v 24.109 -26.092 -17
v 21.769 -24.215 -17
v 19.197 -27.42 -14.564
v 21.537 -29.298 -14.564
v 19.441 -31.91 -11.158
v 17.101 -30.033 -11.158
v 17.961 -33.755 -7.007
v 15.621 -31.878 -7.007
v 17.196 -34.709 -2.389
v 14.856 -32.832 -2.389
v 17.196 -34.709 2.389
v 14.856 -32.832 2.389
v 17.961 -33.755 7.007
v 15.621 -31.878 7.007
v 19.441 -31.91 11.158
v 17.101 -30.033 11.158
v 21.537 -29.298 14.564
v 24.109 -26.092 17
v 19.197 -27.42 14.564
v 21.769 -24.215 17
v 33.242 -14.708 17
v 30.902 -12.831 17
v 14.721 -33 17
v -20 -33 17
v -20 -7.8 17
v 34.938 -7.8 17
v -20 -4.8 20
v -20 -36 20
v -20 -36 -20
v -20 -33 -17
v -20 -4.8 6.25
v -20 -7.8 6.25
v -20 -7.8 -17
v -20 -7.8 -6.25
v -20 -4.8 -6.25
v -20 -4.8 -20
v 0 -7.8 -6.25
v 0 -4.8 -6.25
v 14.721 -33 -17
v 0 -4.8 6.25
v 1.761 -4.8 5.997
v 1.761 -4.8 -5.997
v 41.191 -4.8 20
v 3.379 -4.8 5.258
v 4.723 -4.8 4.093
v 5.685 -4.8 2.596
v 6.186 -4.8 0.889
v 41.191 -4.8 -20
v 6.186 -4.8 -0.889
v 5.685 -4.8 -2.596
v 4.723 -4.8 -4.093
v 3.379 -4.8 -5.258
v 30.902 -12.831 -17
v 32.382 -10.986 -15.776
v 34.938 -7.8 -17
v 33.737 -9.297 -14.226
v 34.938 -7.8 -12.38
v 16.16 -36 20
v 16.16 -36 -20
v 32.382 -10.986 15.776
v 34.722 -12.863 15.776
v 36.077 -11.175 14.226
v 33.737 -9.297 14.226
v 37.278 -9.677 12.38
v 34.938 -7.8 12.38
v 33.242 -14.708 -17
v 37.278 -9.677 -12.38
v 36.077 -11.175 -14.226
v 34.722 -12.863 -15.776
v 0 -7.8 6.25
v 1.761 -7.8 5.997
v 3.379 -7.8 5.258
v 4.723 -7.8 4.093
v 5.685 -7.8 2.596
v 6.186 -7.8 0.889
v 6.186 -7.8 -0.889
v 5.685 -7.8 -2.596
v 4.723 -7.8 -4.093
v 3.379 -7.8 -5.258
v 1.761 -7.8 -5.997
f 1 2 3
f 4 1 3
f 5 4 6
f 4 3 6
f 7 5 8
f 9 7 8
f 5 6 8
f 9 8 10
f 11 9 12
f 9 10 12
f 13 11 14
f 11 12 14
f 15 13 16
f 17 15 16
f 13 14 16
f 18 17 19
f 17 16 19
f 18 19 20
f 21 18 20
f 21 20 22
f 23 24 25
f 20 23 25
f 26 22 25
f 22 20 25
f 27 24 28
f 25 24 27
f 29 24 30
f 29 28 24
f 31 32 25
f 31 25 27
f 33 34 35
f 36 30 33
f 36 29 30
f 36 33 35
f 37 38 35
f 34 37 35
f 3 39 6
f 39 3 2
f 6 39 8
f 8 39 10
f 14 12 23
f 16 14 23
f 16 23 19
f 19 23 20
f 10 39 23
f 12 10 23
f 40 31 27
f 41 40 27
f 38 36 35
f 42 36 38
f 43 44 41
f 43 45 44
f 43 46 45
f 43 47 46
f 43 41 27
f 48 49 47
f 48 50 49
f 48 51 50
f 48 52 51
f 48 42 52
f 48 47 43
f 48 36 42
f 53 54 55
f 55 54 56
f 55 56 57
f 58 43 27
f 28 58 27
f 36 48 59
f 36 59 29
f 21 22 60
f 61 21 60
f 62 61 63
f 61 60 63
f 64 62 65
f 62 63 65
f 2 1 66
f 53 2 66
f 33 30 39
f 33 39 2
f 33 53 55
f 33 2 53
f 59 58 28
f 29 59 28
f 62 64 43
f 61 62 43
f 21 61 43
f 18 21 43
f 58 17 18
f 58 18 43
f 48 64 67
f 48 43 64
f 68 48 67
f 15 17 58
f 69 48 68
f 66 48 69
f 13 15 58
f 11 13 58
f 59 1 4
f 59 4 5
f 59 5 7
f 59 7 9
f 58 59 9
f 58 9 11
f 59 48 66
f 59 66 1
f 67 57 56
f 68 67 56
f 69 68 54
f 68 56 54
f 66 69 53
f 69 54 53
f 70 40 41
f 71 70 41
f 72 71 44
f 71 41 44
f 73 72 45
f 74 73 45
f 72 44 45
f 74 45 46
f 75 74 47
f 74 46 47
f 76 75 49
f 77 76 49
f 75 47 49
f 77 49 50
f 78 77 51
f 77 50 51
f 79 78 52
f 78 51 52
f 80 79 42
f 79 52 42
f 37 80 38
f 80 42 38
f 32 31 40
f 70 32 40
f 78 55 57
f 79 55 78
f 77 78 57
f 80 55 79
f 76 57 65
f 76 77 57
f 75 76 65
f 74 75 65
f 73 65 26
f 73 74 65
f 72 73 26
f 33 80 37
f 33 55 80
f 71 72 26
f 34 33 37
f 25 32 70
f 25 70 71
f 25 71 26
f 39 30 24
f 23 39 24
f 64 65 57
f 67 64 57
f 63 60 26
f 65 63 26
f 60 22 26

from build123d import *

# Parameters (mm, degrees)
BOSS_EXTRUDE1_DEPTH      = 20
BOSS_EXTRUDE1_DEPTH_BACK = 20
CUT_EXTRUDE1_REACH       = 75.759
SKETCH3_W                = 34
SKETCH3_H                = 25.2
CUT_EXTRUDE2_DEPTH       = 3
CUT_EXTRUDE3_REACH       = 57.409


with BuildPart() as part:
    # Sketch1 → Boss-Extrude1 (new, two sides: drawn at the far end of the back side and taken through both)
    with BuildSketch(Plane.XY.offset(-BOSS_EXTRUDE1_DEPTH_BACK)):
        Polygon((-20, -4.8), (41.191180555, -4.8), (16.16, -36), (-20, -36), align=None)
    extrude(amount=BOSS_EXTRUDE1_DEPTH + BOSS_EXTRUDE1_DEPTH_BACK)

    # Cut-Extrude1: up to this plane
    cut_extrude1_end = Plane(origin=(38.851180555, -2.922661458, -20), z_dir=(0.7799999999999999, -0.6257795138864808, 0))
    # Sketch3 → Cut-Extrude1 (cut, up to the surface)
    with BuildSketch(Plane.ZY.offset(20), mode=Mode.PRIVATE) as cut_extrude1_sk1:
        with Locations((0, -20.4)):
            Rectangle(SKETCH3_W, SKETCH3_H)
    cut_extrude1_tool1 = split(extrude(cut_extrude1_sk1.sketch, amount=-CUT_EXTRUDE1_REACH, mode=Mode.PRIVATE), bisect_by=cut_extrude1_end, keep=Keep.BOTH, mode=Mode.PRIVATE)
    add(cut_extrude1_tool1.solids().sort_by_distance((-20, -20.4, 0))[0], mode=Mode.SUBTRACT)

    # Sketch4 → Cut-Extrude2 (cut)
    with BuildSketch(Plane(origin=(25.06363275, -20.108087075, 0), x_dir=(0, 0, 1), z_dir=(-0.78, 0.6257795138864807, 0))):
        with BuildLine():
            Line((-17, 9.329856704), (-17, -5.264662815))
            ThreePointArc((-17, -5.264662815), (0, -16.467403056), (17, -5.264662815))
            Line((17, -5.264662815), (17, 9.329856704))
            ThreePointArc((17, 9.329856704), (15.039919545, 12.805285563), (12.38022373, 15.779598814))
            Line((12.38022373, 15.779598814), (-12.38022373, 15.779598814))
            ThreePointArc((-12.38022373, 15.779598814), (-15.039919545, 12.805285563), (-17, 9.329856704))
        make_face()
    extrude(amount=-CUT_EXTRUDE2_DEPTH, mode=Mode.SUBTRACT)

    # Sketch5 → Cut-Extrude3 (cut, up to next)
    with BuildSketch(Plane(origin=(0, -4.8, 0), x_dir=(1, 0, 0), z_dir=(0, 1, 0)), mode=Mode.PRIVATE) as cut_extrude3_sk1:
        with BuildLine():
            Line((0, 6.25), (-20, 6.25))
            Line((-20, 6.25), (-20, -6.25))
            Line((-20, -6.25), (0, -6.25))
            ThreePointArc((0, -6.25), (6.25, 0), (0, 6.25))
        make_face()
    cut_extrude3_tool1 = extrude(cut_extrude3_sk1.sketch, amount=-CUT_EXTRUDE3_REACH, mode=Mode.PRIVATE) & part.part
    add(cut_extrude3_tool1.solids().sort_by_distance((-7.506569, -4.8, 0))[0], mode=Mode.SUBTRACT)


solid = part.part
